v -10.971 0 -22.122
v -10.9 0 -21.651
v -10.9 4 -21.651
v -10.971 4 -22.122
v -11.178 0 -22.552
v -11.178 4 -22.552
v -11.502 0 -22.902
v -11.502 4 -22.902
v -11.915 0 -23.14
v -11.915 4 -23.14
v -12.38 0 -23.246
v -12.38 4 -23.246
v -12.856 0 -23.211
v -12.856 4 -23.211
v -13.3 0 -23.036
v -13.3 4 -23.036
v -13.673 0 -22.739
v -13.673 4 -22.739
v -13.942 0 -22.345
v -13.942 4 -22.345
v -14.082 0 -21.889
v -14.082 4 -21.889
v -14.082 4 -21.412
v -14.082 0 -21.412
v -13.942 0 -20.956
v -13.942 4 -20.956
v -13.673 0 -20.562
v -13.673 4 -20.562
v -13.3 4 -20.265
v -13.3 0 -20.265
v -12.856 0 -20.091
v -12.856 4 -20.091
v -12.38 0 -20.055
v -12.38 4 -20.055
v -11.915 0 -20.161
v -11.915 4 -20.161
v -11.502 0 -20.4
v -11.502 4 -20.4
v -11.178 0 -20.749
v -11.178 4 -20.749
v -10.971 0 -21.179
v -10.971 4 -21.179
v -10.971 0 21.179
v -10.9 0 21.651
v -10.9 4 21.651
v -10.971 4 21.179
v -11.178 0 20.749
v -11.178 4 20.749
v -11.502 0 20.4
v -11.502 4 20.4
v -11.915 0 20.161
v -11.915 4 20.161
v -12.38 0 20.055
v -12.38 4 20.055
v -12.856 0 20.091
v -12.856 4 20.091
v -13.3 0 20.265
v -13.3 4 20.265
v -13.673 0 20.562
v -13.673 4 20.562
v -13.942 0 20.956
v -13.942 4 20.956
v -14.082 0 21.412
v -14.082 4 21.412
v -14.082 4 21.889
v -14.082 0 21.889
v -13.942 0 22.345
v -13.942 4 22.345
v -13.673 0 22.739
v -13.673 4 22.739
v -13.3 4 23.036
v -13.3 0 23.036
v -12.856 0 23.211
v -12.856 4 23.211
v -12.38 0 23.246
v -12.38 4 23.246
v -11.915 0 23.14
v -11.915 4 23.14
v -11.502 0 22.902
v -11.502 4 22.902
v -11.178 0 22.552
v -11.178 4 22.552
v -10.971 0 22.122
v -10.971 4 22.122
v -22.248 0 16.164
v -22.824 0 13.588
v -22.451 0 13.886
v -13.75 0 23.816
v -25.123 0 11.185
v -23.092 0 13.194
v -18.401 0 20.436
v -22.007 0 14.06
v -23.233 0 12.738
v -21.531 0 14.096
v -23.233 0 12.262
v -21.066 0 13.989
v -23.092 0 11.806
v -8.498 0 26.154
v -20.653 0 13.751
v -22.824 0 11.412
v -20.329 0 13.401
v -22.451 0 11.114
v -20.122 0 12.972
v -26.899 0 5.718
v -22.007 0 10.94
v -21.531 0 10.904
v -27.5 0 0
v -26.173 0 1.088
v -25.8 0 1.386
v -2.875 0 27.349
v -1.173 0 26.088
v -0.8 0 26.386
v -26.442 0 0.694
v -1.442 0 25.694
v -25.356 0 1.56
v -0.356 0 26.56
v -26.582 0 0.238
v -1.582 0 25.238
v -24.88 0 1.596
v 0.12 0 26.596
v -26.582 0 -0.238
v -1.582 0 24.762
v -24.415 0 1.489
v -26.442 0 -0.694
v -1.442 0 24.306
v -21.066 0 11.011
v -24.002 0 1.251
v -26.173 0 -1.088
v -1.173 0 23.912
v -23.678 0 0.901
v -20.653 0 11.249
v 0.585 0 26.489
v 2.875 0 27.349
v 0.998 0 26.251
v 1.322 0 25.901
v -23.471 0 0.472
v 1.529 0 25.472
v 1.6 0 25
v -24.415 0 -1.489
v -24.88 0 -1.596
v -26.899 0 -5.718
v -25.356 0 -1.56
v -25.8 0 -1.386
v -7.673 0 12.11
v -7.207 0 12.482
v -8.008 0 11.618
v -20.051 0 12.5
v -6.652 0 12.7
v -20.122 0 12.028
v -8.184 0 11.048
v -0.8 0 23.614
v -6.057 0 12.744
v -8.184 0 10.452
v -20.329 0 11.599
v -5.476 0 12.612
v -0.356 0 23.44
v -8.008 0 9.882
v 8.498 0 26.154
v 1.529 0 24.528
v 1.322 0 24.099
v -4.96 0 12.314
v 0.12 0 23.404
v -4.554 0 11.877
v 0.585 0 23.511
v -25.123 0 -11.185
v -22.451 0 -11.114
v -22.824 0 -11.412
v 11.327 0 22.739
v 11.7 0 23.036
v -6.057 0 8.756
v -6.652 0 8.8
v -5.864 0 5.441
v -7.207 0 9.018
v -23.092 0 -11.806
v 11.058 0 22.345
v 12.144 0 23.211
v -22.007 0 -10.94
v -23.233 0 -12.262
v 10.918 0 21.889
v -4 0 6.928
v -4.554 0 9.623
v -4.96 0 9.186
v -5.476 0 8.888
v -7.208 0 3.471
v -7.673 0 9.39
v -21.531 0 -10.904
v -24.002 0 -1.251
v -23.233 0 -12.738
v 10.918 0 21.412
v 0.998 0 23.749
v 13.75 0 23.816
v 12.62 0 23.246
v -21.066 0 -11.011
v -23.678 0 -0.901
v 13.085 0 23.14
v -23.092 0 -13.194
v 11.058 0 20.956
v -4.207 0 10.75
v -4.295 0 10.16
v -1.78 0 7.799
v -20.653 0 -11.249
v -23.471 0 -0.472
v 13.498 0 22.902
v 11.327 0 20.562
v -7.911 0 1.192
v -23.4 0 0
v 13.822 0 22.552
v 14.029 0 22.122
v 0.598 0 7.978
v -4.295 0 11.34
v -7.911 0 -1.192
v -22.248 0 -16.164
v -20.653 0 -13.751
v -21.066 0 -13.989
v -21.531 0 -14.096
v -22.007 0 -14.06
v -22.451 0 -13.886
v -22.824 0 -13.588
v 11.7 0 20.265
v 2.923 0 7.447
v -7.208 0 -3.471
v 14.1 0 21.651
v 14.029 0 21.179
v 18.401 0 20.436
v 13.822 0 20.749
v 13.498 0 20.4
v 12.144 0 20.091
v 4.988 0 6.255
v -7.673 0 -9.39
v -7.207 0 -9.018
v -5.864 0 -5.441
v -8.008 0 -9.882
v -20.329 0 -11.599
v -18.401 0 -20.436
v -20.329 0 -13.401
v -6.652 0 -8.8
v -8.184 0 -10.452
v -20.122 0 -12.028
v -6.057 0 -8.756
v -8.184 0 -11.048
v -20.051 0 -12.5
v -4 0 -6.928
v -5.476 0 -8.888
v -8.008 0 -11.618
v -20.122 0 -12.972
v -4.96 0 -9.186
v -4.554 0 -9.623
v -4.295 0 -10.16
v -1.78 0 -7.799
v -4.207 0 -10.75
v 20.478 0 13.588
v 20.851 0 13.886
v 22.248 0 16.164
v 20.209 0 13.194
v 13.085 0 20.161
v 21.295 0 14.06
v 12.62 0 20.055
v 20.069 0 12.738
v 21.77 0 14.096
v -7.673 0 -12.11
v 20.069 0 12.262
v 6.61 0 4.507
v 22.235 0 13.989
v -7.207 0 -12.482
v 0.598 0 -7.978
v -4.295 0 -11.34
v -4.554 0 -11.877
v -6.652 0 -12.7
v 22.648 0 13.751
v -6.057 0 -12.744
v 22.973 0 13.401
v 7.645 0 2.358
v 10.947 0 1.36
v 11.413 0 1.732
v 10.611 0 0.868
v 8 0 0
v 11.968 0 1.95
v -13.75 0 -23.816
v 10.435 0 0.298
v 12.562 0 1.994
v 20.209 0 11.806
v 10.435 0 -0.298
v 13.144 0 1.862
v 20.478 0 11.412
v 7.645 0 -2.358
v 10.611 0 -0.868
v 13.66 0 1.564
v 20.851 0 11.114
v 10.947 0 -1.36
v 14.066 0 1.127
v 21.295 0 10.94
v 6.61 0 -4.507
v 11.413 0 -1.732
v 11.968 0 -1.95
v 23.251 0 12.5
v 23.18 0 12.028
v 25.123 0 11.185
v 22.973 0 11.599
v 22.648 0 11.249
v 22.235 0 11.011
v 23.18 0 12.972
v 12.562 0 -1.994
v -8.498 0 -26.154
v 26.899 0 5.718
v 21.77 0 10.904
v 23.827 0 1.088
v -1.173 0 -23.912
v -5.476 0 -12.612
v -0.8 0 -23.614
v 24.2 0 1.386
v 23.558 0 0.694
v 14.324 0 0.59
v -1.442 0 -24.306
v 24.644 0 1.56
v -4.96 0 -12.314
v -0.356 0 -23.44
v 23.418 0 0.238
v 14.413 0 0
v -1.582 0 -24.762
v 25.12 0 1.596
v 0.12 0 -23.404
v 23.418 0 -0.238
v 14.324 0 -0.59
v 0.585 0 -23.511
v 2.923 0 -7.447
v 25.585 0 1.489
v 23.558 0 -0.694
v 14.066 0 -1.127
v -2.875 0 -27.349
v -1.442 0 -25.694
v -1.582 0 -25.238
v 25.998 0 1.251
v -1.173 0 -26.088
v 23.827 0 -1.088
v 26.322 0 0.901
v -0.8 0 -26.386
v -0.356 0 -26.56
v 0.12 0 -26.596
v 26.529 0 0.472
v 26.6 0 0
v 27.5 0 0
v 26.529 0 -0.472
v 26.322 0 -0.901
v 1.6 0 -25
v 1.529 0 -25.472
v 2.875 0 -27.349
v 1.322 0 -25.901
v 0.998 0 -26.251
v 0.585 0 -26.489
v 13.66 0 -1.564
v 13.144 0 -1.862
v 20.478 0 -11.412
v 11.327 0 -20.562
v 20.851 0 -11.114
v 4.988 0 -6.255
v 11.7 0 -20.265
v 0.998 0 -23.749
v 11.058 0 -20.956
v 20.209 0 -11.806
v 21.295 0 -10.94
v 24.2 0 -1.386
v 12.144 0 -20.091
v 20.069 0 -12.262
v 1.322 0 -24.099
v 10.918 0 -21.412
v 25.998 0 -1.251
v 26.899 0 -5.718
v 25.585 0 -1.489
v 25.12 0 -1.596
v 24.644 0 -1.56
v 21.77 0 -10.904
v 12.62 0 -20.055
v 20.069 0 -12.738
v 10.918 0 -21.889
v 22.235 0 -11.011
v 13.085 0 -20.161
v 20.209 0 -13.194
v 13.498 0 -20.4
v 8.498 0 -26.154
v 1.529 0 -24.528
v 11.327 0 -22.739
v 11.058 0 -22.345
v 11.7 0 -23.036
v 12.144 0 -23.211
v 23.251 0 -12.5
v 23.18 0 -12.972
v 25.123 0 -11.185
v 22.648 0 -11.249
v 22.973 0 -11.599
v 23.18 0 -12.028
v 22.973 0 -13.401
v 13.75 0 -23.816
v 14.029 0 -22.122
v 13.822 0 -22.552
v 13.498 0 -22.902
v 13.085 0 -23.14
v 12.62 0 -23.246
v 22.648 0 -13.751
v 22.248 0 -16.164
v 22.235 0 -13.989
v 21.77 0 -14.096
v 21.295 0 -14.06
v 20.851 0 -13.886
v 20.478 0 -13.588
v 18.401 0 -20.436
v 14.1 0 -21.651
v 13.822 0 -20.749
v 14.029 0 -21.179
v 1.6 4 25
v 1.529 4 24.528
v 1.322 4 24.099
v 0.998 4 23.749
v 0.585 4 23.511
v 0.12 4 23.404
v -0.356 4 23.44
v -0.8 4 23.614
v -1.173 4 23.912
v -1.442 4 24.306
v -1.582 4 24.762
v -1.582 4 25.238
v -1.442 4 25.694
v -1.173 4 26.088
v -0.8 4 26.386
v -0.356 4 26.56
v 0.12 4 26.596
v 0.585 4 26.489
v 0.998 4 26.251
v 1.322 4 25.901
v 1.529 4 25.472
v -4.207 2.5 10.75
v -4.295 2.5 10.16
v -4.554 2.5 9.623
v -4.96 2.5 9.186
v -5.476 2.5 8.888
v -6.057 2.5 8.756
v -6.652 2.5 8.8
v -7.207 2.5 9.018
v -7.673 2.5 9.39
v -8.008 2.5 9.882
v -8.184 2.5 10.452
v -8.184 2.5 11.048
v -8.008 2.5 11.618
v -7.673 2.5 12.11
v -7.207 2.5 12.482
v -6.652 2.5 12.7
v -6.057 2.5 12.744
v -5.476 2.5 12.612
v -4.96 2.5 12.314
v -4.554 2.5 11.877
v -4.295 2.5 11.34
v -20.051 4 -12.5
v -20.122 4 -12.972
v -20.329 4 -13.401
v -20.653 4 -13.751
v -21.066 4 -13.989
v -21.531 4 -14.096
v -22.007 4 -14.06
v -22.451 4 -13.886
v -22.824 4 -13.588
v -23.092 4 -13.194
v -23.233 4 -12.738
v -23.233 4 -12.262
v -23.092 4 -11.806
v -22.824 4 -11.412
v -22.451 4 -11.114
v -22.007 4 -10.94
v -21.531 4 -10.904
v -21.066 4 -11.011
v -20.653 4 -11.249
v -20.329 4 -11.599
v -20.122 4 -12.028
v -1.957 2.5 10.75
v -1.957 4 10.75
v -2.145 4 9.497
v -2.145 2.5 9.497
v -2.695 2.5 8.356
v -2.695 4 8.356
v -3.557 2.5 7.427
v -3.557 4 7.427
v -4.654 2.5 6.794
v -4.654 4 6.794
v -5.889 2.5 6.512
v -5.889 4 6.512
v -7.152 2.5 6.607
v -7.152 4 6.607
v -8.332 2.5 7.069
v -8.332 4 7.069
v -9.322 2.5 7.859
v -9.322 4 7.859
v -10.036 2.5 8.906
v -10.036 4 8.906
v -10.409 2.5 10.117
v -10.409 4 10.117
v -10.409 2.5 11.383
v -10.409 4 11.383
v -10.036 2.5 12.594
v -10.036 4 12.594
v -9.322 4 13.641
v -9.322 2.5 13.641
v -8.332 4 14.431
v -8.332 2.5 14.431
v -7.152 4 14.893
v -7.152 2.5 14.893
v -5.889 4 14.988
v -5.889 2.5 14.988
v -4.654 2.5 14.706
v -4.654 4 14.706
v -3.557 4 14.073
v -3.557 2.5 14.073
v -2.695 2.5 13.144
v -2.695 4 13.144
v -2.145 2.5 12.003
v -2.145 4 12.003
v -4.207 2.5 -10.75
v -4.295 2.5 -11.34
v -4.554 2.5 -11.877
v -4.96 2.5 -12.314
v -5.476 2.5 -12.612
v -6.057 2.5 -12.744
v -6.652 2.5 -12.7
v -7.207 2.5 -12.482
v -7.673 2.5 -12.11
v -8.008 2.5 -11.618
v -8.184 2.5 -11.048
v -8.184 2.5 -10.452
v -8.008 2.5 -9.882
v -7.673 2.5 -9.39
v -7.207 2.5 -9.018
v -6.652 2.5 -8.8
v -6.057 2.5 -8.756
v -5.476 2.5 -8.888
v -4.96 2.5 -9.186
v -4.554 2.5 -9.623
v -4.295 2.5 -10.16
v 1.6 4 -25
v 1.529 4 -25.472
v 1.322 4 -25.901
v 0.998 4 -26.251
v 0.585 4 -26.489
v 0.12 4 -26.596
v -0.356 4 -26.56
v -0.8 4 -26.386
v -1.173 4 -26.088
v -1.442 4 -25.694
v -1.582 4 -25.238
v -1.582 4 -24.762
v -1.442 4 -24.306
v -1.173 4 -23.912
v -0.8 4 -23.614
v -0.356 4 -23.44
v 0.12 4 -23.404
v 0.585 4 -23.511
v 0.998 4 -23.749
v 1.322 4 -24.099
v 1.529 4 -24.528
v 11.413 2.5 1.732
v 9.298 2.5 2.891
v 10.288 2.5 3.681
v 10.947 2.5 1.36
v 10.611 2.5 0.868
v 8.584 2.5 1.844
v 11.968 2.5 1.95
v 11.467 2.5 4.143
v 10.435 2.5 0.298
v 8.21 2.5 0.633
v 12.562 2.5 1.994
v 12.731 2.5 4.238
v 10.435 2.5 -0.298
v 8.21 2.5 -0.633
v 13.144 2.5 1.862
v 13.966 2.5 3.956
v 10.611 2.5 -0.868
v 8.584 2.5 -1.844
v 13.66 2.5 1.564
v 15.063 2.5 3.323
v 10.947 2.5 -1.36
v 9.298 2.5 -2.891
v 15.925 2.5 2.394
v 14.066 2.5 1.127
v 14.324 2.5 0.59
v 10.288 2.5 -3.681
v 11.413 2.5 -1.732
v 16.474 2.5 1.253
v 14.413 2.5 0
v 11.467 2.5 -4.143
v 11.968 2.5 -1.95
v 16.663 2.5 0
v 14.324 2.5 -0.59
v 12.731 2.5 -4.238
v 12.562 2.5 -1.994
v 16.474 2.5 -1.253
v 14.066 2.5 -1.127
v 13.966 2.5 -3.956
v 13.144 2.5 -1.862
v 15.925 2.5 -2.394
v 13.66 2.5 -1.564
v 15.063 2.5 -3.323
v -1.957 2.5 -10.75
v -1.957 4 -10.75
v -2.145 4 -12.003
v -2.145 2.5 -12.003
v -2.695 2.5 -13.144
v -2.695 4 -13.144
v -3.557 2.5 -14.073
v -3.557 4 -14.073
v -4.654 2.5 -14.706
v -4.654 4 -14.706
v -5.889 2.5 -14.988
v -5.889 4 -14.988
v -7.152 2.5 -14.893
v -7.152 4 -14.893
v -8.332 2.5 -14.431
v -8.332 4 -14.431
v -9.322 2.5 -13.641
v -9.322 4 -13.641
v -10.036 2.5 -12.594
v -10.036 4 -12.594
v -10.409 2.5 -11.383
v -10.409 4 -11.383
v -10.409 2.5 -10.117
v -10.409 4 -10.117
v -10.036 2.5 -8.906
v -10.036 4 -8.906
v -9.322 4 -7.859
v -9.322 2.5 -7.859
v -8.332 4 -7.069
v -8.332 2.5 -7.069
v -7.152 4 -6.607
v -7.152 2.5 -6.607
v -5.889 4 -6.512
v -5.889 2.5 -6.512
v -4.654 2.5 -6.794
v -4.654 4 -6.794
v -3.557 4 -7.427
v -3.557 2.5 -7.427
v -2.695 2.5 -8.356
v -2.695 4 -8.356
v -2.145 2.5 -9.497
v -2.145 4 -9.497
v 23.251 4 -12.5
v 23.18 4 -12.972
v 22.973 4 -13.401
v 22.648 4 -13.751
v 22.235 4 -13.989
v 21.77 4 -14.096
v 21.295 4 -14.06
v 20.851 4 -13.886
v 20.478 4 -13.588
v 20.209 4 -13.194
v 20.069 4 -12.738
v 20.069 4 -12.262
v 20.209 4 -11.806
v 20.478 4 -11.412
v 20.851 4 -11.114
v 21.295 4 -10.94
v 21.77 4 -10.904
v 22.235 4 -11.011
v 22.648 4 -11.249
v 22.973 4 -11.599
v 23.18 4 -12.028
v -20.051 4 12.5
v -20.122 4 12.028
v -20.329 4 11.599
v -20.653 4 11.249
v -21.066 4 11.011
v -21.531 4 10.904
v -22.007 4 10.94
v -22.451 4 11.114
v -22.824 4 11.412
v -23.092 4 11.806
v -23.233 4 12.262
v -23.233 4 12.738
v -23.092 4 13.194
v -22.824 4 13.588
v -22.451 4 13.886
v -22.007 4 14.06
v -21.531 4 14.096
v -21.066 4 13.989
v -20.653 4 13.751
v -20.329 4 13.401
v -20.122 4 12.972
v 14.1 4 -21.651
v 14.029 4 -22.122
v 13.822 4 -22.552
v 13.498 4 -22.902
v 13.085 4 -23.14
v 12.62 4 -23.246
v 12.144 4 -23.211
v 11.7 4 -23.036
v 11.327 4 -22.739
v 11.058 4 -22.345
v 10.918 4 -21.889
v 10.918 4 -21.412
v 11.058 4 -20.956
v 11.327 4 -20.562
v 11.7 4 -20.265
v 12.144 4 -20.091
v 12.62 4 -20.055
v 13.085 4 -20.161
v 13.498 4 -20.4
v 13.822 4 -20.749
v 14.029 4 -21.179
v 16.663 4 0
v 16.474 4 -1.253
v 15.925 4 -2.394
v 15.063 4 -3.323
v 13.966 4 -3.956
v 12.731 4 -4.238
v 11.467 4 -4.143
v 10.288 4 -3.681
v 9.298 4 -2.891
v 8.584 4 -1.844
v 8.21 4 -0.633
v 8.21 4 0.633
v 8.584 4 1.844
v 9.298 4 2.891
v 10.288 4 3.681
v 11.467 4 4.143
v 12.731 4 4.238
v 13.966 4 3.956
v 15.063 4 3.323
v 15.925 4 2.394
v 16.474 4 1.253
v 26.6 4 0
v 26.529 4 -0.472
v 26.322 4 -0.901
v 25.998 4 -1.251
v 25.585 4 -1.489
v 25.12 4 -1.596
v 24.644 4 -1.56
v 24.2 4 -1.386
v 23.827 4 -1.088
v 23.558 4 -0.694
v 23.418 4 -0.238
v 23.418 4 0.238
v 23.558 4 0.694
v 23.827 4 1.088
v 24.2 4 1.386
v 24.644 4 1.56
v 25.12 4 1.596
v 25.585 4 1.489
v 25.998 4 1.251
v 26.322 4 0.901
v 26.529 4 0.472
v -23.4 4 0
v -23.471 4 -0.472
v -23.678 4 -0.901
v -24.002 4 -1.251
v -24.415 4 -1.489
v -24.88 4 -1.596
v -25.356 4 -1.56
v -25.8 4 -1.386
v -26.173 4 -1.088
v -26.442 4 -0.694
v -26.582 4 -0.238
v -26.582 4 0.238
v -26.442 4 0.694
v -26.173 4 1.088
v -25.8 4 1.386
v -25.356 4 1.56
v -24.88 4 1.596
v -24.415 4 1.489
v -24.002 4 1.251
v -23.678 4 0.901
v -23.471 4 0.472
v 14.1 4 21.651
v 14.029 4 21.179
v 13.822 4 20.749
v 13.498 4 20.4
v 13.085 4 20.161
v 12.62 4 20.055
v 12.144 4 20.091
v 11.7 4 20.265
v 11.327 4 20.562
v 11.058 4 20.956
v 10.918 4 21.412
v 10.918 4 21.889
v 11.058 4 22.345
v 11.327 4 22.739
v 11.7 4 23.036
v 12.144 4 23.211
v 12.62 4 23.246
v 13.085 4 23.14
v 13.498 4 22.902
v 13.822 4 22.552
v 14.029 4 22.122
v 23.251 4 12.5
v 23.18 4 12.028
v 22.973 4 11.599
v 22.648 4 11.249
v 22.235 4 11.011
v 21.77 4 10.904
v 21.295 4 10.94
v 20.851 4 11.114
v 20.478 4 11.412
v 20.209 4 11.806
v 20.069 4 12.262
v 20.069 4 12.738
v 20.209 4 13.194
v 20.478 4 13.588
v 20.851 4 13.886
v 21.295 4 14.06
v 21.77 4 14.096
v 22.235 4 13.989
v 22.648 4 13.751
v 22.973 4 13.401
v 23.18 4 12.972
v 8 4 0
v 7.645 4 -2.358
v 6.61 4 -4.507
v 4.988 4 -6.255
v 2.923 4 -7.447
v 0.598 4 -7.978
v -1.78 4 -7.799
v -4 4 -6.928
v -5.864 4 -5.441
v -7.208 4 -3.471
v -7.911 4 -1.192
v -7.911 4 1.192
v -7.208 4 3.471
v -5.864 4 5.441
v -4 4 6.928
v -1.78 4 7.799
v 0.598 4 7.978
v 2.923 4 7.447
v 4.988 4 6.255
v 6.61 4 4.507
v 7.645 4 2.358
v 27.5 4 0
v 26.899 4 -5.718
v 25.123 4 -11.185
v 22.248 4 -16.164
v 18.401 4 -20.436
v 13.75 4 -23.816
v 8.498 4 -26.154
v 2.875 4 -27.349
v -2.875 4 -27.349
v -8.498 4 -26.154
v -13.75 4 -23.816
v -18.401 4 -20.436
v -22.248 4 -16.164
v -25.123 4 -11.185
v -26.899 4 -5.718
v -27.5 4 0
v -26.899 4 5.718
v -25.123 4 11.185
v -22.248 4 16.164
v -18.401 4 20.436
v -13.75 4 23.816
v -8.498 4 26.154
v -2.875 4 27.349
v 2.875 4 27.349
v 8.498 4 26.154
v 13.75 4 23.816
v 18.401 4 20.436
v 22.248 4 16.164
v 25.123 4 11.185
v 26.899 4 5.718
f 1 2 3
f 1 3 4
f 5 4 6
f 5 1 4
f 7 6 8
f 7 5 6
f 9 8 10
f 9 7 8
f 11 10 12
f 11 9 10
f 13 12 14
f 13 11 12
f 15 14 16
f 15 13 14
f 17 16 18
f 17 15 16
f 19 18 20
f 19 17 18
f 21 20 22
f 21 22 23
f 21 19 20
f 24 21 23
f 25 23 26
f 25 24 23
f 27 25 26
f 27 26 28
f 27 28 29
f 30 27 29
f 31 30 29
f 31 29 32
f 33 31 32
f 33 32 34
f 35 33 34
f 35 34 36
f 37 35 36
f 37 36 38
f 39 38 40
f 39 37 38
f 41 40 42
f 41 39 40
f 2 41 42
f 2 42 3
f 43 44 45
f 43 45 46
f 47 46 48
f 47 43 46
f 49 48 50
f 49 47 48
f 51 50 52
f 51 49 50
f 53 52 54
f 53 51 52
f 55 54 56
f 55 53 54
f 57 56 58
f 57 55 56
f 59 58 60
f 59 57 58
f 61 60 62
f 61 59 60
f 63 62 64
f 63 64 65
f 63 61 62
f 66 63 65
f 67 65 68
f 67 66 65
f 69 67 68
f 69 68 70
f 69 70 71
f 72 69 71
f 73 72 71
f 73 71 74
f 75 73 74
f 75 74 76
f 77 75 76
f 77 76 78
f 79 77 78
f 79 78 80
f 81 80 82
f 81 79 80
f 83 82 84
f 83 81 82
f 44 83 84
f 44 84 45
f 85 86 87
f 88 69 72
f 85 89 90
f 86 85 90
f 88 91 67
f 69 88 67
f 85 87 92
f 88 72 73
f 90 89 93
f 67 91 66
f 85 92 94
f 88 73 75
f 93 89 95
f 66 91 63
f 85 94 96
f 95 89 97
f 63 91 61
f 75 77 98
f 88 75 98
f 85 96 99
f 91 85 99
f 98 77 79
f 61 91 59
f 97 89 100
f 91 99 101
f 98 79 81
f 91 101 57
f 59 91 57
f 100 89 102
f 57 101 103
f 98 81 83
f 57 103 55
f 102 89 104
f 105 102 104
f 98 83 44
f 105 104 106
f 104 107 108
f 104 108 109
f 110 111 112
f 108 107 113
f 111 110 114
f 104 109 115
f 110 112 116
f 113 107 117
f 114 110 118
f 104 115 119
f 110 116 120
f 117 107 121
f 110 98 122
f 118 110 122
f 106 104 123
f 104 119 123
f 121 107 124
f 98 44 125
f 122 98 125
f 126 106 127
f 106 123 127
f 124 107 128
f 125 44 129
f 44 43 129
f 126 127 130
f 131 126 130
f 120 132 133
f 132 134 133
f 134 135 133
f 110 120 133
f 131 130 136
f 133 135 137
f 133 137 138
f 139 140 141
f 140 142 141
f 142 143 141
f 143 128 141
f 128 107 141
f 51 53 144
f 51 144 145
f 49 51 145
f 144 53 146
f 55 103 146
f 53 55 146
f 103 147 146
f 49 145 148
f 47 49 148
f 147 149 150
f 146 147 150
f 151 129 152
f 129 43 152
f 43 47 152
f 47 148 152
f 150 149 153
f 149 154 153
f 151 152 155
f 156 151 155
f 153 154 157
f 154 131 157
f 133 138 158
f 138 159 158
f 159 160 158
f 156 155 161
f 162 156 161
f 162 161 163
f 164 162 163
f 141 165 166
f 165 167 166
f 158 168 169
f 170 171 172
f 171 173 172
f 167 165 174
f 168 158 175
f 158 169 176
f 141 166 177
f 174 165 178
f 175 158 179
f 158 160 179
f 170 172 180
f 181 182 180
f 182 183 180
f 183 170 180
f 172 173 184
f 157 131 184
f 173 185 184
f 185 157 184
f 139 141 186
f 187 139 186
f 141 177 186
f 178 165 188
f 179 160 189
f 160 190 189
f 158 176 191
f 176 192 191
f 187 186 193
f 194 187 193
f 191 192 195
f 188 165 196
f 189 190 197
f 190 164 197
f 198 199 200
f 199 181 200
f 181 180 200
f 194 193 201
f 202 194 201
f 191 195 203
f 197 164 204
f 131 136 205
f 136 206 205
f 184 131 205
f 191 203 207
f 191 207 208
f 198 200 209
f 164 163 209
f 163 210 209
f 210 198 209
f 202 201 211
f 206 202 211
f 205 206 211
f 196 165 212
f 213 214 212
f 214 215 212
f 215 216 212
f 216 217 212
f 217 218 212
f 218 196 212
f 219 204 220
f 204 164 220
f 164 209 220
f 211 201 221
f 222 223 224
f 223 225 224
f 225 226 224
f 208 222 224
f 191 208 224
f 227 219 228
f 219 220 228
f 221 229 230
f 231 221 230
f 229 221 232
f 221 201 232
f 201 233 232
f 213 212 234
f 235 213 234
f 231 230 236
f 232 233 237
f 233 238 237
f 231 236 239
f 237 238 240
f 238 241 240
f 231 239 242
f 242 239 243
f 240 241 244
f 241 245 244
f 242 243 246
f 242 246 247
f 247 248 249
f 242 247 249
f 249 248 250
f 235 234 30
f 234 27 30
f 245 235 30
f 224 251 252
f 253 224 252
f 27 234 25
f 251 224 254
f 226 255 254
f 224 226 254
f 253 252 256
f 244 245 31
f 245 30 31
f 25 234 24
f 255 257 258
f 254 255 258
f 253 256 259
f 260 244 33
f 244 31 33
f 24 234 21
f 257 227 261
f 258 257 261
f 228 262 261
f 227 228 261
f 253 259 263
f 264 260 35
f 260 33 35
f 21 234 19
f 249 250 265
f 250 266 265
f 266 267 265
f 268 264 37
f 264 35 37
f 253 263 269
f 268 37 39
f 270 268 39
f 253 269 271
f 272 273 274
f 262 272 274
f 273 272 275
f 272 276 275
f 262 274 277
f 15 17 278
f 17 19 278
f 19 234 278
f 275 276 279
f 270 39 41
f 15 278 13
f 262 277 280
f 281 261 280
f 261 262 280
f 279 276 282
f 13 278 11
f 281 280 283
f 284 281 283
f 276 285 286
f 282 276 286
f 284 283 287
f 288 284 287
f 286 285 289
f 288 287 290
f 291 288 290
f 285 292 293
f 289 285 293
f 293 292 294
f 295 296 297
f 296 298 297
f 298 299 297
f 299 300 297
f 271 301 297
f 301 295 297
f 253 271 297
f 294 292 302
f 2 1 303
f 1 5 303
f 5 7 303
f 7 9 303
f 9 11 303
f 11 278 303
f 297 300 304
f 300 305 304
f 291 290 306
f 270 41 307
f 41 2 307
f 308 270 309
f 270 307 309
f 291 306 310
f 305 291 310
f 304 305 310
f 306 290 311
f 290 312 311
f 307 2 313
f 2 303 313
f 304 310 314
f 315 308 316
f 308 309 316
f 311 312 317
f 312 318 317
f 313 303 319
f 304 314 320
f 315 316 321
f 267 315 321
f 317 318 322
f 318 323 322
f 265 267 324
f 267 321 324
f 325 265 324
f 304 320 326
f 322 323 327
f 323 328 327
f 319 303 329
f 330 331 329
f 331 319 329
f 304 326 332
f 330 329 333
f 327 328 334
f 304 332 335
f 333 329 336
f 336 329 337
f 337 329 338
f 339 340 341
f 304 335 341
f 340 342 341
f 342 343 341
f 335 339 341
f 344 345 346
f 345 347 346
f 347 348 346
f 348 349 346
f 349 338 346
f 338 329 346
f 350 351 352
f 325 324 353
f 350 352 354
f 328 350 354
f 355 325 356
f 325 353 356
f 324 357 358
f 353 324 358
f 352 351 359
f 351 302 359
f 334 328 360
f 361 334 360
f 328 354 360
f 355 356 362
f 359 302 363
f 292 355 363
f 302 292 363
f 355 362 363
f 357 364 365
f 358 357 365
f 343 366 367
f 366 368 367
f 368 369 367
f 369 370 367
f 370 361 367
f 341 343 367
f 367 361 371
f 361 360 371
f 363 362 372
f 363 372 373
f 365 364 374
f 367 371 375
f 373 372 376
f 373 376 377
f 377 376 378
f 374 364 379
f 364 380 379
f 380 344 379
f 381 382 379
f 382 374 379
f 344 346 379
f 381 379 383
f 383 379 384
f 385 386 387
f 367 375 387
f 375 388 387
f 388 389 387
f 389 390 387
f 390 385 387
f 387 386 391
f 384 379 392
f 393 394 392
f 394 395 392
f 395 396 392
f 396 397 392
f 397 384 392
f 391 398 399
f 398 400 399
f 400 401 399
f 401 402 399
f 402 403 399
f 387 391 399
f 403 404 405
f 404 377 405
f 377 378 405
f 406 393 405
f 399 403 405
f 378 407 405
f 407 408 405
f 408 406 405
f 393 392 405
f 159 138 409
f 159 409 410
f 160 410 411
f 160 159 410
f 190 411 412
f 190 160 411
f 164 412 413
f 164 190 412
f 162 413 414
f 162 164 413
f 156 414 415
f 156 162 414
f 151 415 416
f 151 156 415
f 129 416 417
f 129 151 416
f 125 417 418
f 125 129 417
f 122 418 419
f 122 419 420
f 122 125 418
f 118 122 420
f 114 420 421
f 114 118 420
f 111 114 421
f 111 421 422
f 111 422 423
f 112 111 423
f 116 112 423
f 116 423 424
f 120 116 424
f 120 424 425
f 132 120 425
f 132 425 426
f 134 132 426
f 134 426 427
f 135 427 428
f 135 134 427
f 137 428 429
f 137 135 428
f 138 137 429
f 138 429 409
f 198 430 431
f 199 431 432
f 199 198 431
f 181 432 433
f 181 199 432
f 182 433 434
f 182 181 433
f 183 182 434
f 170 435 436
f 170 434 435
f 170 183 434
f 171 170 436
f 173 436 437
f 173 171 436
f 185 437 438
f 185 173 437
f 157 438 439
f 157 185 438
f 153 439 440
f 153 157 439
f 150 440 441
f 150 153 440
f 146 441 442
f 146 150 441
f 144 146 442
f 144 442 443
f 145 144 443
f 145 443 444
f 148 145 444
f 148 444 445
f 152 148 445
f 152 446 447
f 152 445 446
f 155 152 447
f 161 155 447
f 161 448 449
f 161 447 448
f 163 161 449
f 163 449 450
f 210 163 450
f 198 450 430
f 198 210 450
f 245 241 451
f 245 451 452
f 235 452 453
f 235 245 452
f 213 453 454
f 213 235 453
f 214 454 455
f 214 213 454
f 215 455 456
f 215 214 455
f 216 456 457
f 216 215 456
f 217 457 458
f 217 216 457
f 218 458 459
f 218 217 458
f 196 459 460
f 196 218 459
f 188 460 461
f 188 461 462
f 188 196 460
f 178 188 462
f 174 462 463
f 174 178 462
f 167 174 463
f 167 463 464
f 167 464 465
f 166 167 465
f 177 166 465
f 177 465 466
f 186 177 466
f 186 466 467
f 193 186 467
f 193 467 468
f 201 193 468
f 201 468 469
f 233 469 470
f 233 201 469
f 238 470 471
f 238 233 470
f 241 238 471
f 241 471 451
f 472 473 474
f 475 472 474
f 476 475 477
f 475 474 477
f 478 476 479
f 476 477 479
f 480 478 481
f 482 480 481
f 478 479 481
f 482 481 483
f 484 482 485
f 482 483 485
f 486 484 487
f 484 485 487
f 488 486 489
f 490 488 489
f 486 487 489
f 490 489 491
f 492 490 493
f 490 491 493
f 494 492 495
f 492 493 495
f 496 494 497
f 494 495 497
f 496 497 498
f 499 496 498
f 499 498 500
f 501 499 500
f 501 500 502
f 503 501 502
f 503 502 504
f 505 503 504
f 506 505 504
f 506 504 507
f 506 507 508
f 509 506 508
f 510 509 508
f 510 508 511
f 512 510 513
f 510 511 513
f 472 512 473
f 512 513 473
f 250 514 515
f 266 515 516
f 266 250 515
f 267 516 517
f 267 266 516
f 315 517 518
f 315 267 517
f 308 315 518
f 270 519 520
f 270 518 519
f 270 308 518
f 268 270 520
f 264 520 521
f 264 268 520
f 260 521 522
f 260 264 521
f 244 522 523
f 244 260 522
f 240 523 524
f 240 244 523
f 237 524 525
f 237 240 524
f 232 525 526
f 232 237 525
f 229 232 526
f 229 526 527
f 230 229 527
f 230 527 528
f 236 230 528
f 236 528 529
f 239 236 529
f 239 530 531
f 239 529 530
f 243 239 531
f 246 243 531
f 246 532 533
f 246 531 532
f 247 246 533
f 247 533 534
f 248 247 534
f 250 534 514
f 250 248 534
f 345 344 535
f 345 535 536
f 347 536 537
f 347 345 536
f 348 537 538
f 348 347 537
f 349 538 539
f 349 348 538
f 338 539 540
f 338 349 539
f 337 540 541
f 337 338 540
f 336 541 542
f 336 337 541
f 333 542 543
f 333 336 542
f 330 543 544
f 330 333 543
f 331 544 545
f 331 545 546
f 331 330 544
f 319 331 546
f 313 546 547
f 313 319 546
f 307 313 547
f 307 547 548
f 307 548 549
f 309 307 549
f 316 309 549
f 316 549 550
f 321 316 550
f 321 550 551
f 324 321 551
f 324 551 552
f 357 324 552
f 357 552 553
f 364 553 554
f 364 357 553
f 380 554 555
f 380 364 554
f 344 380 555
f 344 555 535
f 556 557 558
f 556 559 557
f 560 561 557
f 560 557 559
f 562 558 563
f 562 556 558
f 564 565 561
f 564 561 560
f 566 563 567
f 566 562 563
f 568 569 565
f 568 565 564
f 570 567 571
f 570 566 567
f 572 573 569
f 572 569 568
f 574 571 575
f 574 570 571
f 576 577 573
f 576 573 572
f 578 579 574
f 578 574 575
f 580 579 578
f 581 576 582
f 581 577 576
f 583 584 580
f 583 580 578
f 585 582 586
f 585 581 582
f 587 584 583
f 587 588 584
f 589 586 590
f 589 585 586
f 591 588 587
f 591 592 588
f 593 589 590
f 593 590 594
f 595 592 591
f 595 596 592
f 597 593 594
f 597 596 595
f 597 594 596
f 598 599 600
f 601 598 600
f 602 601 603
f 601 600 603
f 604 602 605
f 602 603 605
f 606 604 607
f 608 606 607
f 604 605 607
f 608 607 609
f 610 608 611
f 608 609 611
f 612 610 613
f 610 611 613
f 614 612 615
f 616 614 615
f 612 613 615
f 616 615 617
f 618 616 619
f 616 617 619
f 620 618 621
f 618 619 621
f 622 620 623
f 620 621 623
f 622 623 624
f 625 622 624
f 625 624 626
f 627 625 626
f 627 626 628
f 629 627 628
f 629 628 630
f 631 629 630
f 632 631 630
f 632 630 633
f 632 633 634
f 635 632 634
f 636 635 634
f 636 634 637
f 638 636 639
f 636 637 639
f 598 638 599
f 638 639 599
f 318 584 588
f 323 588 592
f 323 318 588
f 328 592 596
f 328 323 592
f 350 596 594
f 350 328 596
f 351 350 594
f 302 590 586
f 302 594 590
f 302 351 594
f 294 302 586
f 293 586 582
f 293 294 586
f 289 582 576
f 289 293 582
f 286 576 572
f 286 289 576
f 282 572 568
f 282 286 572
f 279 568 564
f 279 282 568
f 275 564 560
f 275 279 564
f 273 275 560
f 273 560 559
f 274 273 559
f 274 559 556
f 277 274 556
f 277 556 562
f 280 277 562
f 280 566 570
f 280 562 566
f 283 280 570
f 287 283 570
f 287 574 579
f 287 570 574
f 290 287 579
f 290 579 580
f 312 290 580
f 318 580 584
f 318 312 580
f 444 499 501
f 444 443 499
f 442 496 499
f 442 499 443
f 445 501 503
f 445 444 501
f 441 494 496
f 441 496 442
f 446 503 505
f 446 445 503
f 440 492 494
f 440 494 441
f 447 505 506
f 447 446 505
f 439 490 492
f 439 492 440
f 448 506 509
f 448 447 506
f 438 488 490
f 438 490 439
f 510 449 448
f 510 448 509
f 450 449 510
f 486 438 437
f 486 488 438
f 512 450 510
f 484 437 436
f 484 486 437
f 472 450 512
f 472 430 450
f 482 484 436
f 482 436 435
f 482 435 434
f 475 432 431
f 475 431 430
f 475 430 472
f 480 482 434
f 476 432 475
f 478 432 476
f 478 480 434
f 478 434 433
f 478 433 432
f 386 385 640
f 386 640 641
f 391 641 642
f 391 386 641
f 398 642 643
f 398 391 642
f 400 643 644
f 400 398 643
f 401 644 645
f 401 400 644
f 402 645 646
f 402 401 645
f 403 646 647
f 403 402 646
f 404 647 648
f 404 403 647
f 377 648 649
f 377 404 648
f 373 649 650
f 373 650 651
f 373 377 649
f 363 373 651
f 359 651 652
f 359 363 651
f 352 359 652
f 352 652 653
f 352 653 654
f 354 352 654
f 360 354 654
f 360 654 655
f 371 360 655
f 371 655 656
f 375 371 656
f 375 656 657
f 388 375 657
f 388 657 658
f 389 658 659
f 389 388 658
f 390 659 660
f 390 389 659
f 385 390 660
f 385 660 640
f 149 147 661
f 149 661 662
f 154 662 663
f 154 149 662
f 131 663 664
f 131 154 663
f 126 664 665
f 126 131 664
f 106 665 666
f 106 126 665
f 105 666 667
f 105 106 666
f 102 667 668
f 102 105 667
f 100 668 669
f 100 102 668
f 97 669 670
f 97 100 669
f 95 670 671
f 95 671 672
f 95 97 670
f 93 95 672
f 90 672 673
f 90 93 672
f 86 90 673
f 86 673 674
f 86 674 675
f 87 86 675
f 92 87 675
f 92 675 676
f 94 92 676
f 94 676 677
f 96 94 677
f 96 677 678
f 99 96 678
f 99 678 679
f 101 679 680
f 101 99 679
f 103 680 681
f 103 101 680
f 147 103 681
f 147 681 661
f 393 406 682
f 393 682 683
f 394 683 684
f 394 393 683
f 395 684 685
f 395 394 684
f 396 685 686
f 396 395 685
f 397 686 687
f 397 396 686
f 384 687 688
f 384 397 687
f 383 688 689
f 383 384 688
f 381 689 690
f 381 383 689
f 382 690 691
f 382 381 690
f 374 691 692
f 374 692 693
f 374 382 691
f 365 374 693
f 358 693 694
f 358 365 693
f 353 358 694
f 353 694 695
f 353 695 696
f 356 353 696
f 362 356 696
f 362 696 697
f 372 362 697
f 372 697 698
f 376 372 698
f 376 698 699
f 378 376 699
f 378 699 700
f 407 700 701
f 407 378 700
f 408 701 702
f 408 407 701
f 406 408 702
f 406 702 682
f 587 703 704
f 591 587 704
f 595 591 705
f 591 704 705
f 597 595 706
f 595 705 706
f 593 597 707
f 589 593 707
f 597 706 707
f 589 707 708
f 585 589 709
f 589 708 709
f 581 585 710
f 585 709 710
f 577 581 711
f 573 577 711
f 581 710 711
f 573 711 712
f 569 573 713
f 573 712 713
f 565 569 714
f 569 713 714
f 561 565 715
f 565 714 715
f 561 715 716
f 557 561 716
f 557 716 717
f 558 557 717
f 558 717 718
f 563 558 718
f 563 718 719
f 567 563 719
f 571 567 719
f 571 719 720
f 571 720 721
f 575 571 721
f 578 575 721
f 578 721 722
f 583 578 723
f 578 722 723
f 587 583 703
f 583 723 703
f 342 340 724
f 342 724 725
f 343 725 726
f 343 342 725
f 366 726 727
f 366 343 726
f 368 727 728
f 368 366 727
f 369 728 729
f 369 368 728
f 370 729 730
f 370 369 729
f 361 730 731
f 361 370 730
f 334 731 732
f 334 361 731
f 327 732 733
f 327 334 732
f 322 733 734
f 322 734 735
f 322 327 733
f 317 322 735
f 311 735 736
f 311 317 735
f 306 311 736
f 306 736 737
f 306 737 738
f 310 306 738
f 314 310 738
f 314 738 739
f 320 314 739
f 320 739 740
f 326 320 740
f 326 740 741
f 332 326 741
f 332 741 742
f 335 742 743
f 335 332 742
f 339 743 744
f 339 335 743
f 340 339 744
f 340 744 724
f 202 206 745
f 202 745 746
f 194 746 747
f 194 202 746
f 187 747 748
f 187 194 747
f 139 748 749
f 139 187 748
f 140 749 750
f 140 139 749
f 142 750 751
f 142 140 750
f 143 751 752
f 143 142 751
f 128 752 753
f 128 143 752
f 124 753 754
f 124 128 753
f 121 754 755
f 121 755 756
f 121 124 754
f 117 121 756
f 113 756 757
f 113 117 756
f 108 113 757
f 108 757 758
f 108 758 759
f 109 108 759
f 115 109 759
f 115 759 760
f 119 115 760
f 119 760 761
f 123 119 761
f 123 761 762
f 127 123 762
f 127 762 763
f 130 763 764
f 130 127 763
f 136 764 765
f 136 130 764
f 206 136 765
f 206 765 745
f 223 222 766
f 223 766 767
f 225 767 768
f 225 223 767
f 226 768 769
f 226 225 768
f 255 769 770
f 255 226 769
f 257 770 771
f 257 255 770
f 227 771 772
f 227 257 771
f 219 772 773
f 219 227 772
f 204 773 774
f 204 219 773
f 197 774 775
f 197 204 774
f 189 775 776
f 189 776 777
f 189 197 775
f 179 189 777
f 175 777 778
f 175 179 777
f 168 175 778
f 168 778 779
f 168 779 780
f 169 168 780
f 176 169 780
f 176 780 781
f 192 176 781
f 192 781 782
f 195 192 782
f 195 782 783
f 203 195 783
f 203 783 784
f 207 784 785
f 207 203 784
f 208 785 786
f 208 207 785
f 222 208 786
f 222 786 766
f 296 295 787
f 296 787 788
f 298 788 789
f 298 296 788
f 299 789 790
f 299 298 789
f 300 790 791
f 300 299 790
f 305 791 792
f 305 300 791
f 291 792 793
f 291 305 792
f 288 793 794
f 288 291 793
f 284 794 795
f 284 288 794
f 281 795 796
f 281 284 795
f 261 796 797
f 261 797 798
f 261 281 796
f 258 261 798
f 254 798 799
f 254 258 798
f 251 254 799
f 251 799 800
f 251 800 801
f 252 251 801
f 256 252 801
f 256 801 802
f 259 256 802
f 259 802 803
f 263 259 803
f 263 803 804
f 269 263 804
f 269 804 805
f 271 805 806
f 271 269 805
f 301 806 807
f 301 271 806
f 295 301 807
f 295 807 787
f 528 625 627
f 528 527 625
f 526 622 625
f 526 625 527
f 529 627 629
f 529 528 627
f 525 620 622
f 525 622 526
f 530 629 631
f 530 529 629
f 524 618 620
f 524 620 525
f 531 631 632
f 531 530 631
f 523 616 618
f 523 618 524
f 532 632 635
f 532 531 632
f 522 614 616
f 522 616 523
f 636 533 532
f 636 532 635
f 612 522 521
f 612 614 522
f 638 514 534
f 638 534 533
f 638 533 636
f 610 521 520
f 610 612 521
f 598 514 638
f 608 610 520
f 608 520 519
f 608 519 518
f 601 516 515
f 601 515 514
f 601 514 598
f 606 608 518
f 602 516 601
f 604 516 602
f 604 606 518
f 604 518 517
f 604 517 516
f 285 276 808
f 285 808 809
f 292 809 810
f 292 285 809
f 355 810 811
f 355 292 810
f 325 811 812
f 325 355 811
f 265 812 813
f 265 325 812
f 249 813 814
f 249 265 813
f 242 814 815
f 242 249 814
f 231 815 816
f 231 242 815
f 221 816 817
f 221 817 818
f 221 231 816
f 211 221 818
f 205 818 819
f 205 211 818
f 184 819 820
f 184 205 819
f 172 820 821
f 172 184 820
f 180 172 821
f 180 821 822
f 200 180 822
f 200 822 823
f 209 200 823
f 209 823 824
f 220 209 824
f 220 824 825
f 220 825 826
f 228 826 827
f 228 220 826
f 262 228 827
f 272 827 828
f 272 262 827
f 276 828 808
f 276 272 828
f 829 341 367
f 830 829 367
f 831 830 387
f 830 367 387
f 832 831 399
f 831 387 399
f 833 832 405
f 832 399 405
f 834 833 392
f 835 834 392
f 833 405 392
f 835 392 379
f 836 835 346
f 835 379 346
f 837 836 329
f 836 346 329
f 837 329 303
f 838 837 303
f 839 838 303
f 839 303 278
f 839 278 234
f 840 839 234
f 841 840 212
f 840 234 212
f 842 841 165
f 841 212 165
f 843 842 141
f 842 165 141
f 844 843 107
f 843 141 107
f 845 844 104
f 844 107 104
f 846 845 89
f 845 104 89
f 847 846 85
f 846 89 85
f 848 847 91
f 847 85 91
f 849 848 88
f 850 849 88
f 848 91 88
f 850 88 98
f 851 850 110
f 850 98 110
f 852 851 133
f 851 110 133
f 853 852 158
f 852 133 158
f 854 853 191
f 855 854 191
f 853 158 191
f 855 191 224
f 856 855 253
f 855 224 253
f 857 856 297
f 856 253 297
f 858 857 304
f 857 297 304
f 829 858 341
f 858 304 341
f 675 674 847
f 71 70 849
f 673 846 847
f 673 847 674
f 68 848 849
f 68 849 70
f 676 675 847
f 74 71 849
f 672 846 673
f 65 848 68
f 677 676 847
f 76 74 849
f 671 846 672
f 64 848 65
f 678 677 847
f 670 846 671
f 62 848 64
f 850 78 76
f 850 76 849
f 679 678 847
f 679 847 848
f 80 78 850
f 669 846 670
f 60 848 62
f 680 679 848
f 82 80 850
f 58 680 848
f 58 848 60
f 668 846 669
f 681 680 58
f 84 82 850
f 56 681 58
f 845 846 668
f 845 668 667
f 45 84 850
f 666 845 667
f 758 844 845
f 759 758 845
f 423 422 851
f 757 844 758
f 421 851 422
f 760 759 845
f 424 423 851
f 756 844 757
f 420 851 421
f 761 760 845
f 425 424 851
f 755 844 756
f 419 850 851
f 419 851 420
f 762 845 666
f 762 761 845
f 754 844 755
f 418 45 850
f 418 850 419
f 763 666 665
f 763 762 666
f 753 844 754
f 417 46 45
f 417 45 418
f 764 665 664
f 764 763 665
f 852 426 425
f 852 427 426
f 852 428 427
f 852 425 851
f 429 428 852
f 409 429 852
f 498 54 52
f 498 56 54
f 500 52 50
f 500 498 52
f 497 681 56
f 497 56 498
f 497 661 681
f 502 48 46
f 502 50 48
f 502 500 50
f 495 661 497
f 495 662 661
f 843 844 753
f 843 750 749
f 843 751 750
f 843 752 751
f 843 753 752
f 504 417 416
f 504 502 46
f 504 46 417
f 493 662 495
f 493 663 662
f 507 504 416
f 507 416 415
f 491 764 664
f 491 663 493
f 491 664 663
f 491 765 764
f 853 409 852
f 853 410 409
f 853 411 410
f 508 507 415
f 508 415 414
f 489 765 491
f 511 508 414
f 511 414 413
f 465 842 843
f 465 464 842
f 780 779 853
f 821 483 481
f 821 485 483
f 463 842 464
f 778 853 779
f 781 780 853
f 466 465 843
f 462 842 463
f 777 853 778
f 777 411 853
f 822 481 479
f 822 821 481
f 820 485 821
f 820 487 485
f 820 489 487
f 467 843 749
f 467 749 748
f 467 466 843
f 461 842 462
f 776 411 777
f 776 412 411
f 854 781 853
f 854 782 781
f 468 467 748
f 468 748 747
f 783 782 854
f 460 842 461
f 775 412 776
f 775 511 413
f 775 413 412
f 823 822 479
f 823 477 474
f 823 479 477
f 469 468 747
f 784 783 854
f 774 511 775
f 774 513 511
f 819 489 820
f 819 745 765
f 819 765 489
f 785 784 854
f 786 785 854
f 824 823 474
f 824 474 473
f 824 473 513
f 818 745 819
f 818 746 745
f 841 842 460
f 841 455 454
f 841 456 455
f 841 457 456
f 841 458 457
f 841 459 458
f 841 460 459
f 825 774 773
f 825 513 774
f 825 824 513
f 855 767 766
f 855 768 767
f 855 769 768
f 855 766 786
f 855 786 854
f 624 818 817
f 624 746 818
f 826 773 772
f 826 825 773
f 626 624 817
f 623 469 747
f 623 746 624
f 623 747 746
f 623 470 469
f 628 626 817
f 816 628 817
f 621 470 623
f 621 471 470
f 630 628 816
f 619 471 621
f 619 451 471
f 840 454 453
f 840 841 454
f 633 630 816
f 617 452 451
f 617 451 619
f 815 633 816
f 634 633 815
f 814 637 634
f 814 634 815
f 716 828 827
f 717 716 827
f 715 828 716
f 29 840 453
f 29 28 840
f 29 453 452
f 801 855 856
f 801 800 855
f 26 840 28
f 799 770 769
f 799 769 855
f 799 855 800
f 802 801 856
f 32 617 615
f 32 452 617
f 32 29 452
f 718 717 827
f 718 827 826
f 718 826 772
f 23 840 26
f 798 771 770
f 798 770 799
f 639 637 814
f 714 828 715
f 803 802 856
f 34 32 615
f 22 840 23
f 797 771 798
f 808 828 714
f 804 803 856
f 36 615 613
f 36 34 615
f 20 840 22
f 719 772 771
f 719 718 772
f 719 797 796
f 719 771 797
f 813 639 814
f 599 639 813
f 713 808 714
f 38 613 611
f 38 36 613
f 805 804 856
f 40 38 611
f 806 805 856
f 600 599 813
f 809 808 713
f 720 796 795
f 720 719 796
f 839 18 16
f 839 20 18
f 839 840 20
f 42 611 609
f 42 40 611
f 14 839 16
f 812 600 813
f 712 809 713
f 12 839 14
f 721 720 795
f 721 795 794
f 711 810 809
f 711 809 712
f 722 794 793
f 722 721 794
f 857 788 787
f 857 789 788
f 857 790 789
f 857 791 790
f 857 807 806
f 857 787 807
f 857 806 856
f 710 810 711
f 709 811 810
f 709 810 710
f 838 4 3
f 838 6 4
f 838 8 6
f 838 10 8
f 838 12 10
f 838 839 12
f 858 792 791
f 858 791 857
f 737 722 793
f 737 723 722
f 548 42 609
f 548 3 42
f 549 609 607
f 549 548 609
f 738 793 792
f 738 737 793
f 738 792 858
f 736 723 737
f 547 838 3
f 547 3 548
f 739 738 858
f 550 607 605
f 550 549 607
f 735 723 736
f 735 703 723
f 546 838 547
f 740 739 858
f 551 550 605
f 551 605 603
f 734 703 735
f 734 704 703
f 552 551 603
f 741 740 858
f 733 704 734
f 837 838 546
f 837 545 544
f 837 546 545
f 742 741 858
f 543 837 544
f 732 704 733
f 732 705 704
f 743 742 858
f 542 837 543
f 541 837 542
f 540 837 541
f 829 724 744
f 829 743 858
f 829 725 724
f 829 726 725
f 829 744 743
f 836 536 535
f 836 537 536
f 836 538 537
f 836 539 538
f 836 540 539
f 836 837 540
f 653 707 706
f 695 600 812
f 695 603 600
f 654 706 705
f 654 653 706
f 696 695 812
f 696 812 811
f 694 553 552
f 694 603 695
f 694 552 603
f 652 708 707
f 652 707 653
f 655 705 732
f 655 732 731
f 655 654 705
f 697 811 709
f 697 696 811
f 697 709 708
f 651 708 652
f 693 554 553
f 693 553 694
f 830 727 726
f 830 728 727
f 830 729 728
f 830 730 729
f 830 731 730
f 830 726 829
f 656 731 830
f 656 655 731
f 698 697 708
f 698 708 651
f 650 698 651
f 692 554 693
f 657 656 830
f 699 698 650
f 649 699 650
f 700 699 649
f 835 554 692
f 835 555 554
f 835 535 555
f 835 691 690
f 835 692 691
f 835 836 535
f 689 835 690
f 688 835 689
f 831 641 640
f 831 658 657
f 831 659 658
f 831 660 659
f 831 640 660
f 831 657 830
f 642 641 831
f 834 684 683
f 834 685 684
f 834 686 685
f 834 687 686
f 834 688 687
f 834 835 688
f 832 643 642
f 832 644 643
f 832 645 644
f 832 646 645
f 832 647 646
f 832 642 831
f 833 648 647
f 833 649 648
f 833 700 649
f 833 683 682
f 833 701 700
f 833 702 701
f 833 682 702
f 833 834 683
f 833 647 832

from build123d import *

# Parameters (mm, degrees)
SKETCH1_R           = 27.5
SKETCH1_R_2         = 1.6
SKETCH1_R_3         = 8
SKETCH1_R_4         = 2
BOSS_EXTRUDE1_DEPTH = 4
SKETCH2_R           = 4.25
CUT_EXTRUDE1_DEPTH  = 1.5


with BuildPart() as part:
    # Sketch1 → Boss-Extrude1 (new body)
    with BuildSketch(Plane(origin=(0, 0, 0), x_dir=(1, 0, 0), z_dir=(0, 1, 0))):
        Circle(SKETCH1_R)
        with Locations((0, 25)):
            Circle(SKETCH1_R_2, mode=Mode.SUBTRACT)
        with Locations((12.5, 21.650635095)):
            Circle(SKETCH1_R_2, mode=Mode.SUBTRACT)
        with Locations((21.650635095, 12.5)):
            Circle(SKETCH1_R_2, mode=Mode.SUBTRACT)
        with Locations((25, 0)):
            Circle(SKETCH1_R_2, mode=Mode.SUBTRACT)
        with Locations((21.650635095, -12.5)):
            Circle(SKETCH1_R_2, mode=Mode.SUBTRACT)
        with Locations((12.5, -21.650635095)):
            Circle(SKETCH1_R_2, mode=Mode.SUBTRACT)
        with Locations((0, -25)):
            Circle(SKETCH1_R_2, mode=Mode.SUBTRACT)
        with Locations((-12.5, -21.650635095)):
            Circle(SKETCH1_R_2, mode=Mode.SUBTRACT)
        with Locations((-21.650635095, -12.5)):
            Circle(SKETCH1_R_2, mode=Mode.SUBTRACT)
        with Locations((-25, 0)):
            Circle(SKETCH1_R_2, mode=Mode.SUBTRACT)
        with Locations((-21.650635095, 12.5)):
            Circle(SKETCH1_R_2, mode=Mode.SUBTRACT)
        with Locations((-12.5, 21.650635095)):
            Circle(SKETCH1_R_2, mode=Mode.SUBTRACT)
        Circle(SKETCH1_R_3, mode=Mode.SUBTRACT)
        with Locations((12.413030788, 0)):
            Circle(SKETCH1_R_4, mode=Mode.SUBTRACT)
        with Locations((-6.206515394, -10.75)):
            Circle(SKETCH1_R_4, mode=Mode.SUBTRACT)
        with Locations((-6.206515394, 10.75)):
            Circle(SKETCH1_R_4, mode=Mode.SUBTRACT)
    extrude(amount=BOSS_EXTRUDE1_DEPTH)

    # Sketch2 → Cut-Extrude1 (cut)
    with BuildSketch(Plane(origin=(0, 4, 0), x_dir=(1, 0, 0), z_dir=(0, 1, 0))):
        with Locations((-6.206515394, 10.75)):
            Circle(SKETCH2_R)
        with Locations((12.413030788, 0)):
            Circle(SKETCH2_R)
        with Locations((-6.206515394, -10.75)):
            Circle(SKETCH2_R)
    extrude(amount=-CUT_EXTRUDE1_DEPTH, mode=Mode.SUBTRACT)


solid = part.part
